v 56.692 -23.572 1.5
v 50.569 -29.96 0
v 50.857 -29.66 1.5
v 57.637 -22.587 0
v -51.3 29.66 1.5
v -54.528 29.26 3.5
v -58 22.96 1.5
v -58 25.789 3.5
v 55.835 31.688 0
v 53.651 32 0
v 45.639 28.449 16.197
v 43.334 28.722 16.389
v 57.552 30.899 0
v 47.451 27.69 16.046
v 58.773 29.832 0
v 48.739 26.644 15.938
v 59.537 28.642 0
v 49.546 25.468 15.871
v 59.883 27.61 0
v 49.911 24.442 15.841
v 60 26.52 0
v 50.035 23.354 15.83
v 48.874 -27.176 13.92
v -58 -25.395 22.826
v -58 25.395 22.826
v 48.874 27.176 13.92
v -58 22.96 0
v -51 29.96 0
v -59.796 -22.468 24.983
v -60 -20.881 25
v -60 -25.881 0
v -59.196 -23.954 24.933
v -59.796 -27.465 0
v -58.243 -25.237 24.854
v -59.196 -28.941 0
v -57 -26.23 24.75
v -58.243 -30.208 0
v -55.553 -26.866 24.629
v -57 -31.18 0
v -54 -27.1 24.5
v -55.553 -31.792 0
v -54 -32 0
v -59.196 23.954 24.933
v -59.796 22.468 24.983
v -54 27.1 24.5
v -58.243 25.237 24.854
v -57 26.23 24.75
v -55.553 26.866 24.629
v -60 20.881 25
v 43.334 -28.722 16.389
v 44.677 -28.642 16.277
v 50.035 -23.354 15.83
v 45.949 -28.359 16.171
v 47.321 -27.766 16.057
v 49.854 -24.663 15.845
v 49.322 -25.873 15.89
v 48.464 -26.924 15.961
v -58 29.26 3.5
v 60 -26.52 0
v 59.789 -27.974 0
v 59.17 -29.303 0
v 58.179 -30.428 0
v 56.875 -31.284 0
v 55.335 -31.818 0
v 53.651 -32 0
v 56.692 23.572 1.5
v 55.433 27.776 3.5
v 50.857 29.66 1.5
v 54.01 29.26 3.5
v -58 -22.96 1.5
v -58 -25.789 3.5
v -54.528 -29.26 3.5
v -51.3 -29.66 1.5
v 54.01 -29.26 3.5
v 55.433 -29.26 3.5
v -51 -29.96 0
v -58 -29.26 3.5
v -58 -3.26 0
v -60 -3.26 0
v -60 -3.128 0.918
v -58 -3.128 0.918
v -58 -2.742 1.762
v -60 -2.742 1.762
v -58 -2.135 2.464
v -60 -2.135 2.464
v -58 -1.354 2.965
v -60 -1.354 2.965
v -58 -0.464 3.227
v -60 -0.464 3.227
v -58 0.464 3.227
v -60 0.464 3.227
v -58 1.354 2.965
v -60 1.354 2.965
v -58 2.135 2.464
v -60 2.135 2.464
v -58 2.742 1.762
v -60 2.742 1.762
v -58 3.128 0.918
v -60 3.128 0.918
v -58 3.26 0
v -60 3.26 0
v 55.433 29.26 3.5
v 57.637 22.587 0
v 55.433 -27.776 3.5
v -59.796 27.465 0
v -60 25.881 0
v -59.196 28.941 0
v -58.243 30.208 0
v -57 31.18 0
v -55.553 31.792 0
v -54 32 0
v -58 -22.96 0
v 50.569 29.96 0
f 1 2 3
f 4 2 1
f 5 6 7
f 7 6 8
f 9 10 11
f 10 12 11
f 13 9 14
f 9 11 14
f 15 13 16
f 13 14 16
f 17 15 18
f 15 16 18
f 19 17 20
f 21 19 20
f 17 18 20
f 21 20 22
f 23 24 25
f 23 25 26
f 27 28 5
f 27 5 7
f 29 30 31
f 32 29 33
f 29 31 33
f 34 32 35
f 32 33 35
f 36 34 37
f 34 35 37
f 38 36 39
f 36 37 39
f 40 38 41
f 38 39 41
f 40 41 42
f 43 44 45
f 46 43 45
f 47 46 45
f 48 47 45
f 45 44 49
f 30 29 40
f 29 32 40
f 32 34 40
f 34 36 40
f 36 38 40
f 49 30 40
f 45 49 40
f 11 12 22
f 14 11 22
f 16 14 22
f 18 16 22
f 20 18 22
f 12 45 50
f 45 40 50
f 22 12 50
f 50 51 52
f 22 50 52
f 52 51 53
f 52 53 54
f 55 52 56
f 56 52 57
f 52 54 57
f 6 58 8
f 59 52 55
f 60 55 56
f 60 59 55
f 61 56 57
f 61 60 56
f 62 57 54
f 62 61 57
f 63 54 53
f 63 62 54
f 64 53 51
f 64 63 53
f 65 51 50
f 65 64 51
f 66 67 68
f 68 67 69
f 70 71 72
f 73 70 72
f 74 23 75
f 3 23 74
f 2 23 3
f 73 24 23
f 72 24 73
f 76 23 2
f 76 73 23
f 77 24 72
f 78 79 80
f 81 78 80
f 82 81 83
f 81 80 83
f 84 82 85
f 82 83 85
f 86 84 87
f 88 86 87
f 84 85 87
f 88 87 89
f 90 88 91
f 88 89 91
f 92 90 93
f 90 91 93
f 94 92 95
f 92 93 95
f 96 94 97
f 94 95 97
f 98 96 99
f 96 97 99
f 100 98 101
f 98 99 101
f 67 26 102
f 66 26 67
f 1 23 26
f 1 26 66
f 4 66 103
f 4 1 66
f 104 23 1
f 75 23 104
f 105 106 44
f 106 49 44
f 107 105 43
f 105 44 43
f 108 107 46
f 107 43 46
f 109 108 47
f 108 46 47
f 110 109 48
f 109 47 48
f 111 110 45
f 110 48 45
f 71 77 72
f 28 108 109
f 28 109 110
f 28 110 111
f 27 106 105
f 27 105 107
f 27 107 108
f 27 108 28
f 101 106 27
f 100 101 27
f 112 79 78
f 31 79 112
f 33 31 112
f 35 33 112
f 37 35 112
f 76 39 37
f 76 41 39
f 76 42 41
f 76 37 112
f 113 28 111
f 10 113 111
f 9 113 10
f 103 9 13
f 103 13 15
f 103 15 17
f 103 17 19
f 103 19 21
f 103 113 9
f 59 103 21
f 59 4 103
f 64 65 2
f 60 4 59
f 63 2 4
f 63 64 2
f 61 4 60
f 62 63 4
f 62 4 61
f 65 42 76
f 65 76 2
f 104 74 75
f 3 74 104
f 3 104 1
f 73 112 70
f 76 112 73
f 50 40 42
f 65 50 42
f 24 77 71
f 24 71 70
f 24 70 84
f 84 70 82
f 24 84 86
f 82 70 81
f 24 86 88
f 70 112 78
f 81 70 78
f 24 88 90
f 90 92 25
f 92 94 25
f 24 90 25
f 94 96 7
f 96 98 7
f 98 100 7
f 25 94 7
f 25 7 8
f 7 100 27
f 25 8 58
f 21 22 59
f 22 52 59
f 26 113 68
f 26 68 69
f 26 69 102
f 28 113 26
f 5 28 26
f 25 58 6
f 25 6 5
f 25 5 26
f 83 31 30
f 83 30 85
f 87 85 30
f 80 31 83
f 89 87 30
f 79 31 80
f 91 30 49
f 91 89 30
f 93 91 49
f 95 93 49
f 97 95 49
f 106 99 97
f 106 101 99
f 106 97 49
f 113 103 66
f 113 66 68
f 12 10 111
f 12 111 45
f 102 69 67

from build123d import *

# Parameters (mm, degrees)
F0_W      = 120
F0_H      = 64
F1_DEPTH  = 25
F3_DEPTH  = 64.001
F5_DEPTH  = 64.001
F7_DEPTH  = 120.001
F8_T      = -2
F9_R      = 3.259803
F10_DEPTH = 25
F12_DEPTH = 3.5
F13_SIZE  = 2
F14_R     = 6


with BuildPart() as f1:
    # F0 (on Top) → F1 (new body)
    with BuildSketch(Plane.XY):
        Rectangle(F0_W, F0_H)
    extrude(amount=F1_DEPTH)

    # F2 (on face) → F3 (cut, through all)
    with BuildSketch(Plane.XZ.offset(32)):
        Polygon((60, 25), (-60, 25), (60, 15), align=None)
    extrude(amount=-F3_DEPTH, mode=Mode.SUBTRACT)

    # F4 (on face) → F5 (cut, through all)
    with BuildSketch(Plane.XZ.offset(32)):
        Polygon((50.034542, 15.830455), (60, 0), (60, 15), align=None)
    extrude(amount=-F5_DEPTH, mode=Mode.SUBTRACT)

    # F6 (on face) → F7 (cut, through all)
    with BuildSketch(Plane(origin=(-60, 0, 0), x_dir=(0, -1, 0), z_dir=(-1, 0, 0))):
        Polygon((-27, 25), (-32, 25), (-32, 0), align=None)
        Polygon((32, 25), (27, 25), (32, 0), align=None)
    extrude(amount=-F7_DEPTH, mode=Mode.SUBTRACT)

    # F8
    f8_openings = [f1.faces().sort_by_distance(p)[0] for p in [
        (0, 0, 0),
    ]]
    offset(amount=F8_T, openings=f8_openings)

    # F9 (on face) → F10 (cut)
    with BuildSketch(Plane(origin=(-60, 0, 0), x_dir=(0, -1, 0), z_dir=(-1, 0, 0))):
        Circle(F9_R)
    extrude(amount=-F10_DEPTH, mode=Mode.SUBTRACT)

    # F11 (on face) → F12 (join)
    with BuildSketch(Plane(origin=(0, 0, 0), x_dir=(1, 0, 0), z_dir=(0, 0, -1))):
        Polygon((-51, 29.960392), (-58, 29.960392), (-58, 22.960392), align=None)
        Polygon((57.63671, 22.587352), (57.63671, 29.960392), (50.568968, 29.960392), align=None)
        Polygon((57.63671, -22.587352), (50.568968, -29.960392), (57.63671, -29.960392), align=None)
        Polygon((-58, -22.960392), (-58, -29.960392), (-51, -29.960392), align=None)
    extrude(amount=-F12_DEPTH)

    # F13
    f13_edges = [f1.edges().sort_by_distance(p)[0] for p in [
        (-54.85, 26.110392, 3.5),
        (53.336701, -27.073104, 3.5),
        (-54.85, -26.110392, 3.5),
        (53.336701, 27.073104, 3.5),
    ]]
    chamfer(f13_edges, length=F13_SIZE)

    # F14
    f14_edges = [f1.edges().sort_by_distance(p)[0] for p in [
        (55.017271, -30.416955, 7.915227),
        (55.017271, 30.416955, 7.915227),
        (-60, -29.5, 12.5),
        (-60, 29.5, 12.5),
    ]]
    fillet(f14_edges, radius=F14_R)


solid = f1.part
